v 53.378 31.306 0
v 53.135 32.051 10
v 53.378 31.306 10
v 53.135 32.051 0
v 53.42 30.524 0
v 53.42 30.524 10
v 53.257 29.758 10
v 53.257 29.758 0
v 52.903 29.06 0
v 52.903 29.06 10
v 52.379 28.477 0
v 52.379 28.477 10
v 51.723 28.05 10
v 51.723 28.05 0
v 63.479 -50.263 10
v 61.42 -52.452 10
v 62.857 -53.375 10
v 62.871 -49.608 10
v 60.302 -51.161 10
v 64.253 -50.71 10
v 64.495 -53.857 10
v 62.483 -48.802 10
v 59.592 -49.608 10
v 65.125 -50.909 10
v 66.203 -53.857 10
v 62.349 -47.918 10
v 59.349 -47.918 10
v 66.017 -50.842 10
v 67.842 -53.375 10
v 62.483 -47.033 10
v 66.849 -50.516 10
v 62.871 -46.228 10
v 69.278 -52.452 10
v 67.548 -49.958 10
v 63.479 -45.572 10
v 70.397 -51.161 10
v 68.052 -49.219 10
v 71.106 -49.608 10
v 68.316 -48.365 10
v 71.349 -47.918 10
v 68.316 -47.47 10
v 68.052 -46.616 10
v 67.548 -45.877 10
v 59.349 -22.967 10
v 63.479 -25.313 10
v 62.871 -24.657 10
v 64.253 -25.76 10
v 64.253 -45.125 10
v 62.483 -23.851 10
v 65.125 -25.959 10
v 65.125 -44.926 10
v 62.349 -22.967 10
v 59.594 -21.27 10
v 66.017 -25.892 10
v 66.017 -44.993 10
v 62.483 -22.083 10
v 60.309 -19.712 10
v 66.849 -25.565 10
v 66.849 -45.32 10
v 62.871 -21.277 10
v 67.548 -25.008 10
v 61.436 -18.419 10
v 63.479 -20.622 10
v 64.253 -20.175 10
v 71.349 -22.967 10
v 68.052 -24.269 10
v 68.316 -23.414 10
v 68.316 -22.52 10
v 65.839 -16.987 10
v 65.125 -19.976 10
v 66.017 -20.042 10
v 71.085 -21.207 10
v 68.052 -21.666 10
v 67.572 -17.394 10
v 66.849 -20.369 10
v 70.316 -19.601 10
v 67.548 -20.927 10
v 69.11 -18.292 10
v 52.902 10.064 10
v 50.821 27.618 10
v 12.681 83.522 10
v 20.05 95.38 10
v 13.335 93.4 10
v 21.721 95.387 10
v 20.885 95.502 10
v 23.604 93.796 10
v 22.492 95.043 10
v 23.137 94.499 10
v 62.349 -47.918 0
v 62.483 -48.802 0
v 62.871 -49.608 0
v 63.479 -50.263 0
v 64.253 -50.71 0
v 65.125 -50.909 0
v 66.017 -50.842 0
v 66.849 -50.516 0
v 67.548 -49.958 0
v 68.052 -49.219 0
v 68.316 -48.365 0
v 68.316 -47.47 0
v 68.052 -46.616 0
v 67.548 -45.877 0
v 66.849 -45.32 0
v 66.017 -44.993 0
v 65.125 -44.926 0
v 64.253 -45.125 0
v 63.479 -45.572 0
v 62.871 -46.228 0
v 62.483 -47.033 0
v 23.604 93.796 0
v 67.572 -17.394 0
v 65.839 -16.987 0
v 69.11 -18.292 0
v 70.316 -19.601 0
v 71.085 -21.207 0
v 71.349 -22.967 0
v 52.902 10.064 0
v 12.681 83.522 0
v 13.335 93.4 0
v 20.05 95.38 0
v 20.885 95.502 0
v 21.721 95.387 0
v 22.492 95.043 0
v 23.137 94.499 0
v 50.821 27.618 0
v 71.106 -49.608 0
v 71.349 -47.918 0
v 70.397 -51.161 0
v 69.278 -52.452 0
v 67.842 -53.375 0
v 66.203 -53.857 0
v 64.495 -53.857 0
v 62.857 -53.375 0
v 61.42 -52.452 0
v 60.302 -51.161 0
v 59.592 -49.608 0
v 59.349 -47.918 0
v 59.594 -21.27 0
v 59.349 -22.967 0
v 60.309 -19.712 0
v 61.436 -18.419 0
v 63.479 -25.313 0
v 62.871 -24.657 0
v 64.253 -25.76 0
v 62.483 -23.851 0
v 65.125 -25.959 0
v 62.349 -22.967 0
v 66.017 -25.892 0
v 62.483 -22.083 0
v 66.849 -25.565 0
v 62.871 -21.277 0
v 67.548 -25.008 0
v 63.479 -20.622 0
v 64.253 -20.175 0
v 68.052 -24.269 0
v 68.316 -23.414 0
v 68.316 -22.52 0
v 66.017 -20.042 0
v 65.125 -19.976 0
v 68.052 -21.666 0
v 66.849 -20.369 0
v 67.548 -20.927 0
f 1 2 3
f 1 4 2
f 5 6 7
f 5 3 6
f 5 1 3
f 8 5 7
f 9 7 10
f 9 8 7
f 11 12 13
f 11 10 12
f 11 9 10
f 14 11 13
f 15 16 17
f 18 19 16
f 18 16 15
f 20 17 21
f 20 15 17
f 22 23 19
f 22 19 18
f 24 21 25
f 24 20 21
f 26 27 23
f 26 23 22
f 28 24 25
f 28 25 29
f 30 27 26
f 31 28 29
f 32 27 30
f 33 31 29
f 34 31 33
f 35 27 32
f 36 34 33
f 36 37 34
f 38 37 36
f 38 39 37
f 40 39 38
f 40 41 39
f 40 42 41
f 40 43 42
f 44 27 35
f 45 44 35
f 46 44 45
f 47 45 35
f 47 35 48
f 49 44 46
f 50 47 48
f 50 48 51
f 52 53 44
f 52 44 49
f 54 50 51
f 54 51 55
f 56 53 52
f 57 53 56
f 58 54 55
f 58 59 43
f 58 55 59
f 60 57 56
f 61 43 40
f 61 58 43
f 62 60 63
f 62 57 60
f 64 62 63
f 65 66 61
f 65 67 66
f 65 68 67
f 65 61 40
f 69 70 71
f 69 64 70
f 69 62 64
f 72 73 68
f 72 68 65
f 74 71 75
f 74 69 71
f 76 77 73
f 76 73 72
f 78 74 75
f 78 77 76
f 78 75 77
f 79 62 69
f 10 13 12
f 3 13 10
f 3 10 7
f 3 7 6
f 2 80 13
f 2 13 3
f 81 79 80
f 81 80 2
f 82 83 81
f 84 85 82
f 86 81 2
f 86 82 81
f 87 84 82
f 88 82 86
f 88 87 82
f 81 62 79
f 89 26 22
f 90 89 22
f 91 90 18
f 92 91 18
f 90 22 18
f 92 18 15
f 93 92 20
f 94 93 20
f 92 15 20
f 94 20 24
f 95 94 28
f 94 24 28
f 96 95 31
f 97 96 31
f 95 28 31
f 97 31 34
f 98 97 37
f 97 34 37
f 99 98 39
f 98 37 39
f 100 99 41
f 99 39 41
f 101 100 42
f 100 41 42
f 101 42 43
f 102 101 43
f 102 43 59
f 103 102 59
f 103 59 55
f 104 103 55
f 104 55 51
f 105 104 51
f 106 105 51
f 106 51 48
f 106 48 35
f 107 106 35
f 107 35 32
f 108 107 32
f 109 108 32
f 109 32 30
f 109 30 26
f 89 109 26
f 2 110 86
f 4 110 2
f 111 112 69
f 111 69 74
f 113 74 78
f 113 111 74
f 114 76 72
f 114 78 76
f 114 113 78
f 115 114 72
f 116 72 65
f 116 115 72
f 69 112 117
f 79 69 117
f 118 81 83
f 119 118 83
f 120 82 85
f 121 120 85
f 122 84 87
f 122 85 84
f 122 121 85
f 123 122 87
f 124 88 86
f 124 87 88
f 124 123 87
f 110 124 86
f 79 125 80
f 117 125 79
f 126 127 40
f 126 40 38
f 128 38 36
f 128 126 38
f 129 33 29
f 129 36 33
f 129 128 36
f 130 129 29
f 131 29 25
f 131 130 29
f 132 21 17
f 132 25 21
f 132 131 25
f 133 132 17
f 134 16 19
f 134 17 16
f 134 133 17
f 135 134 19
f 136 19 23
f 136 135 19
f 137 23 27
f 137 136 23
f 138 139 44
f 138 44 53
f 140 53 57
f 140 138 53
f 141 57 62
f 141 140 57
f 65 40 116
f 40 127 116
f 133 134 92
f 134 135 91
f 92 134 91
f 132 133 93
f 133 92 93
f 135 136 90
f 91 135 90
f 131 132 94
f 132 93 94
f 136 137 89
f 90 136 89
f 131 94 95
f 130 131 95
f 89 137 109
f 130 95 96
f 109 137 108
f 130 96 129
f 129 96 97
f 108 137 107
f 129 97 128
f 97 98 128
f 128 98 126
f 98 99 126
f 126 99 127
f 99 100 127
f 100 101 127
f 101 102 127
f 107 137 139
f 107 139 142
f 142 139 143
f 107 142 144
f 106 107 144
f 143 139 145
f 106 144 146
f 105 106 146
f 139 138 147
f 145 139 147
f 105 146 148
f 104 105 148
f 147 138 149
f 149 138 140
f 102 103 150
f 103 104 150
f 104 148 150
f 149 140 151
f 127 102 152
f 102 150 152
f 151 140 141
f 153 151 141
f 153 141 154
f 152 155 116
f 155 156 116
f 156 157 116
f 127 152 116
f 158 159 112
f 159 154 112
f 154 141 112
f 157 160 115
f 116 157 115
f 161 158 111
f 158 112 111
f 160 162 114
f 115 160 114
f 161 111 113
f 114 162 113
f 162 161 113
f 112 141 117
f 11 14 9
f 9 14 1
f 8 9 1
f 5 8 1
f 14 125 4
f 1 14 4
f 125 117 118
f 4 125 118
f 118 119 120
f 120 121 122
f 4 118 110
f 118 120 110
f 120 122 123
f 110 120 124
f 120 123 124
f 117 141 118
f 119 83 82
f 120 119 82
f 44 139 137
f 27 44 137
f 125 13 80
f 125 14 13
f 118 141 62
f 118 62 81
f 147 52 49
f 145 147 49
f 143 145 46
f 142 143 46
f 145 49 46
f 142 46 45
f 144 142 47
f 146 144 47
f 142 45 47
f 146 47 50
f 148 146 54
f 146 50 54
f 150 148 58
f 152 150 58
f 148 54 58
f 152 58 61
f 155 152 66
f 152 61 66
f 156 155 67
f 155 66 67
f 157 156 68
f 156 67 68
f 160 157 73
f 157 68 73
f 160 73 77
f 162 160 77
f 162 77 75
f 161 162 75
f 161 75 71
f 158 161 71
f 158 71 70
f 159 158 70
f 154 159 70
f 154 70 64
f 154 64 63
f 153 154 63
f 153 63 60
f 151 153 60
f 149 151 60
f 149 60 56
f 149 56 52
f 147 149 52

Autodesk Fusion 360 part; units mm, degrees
sketch "Sketch1" plane through (0, 0, 0) normal (0, 0, 1) x (1, 0, 0)
  line L0 (59.3493, -22.9672) -> (59.3493, -47.9176)
  arc A0 (59.3493, -47.9176) -> (71.3493, -47.9176) centre (65.3493, -47.9176) ccw
  line L1 (71.3493, -47.9176) -> (71.3493, -22.9672)
  arc A1 (71.3493, -22.9672) -> (59.3493, -22.9672) centre (65.3493, -22.9672) ccw
  line L2 (65.3493, -22.9672) -> (65.3493, -47.9176) construction
  line L3 (61.4359, -18.4191) -> (12.6813, 83.5221)
  line L4 (12.6813, 83.5221) -> (13.3354, 93.4004)
  line L5 (13.3354, 93.4004) -> (20.0498, 95.3795)
  line L6 (23.6044, 93.7962) -> (53.1349, 32.0506)
  arc A2 (23.6044, 93.7962) -> (20.0498, 95.3795) centre (20.898, 92.5019) ccw
  line L7 (65.8452, -17.0002) -> (52.9015, 10.0639)
  line L8 (51.7229, 28.0498) -> (50.8208, 27.6184)
  line L9 (50.8208, 27.6184) -> (52.9015, 10.0639)
  arc A3 (51.7229, 28.0498) -> (53.1349, 32.0506) centre (50.4285, 30.7562) ccw
  point P0 (22.5016, 96.1021)
  point P1 (54.4293, 29.3442)
  dimension "d1" = 12
  dimension "d2" = 113
  dimension "d3" = 154.44
  dimension "d4" = 74
  dimension "d5" = 9.9
  dimension "d7" = 3
  dimension "d8" = 7
  dimension "d9" = 30
  dimension "d10" = 4.59
  dimension "d11" = 3
  dimension "d12" = 1
extrude "Extrude1" add sketch "Sketch1" along normal blind 10
sketch "Sketch2" plane through (0, 0, 10) normal (0, 0, 1) x (-1, 0, 0)
  line L0 (-50.8208, -27.6184) -> (-51.7229, -28.0498)
  arc A0 (-51.7229, -28.0498) -> (-53.1349, -32.0506) centre (-50.4285, -30.7562) ccw
  line L1 (-53.1349, -32.0506) -> (-23.6044, -93.7962)
  arc A1 (-23.6044, -93.7962) -> (-20.0498, -95.3795) centre (-20.898, -92.5019) ccw
  line L2 (-20.0498, -95.3795) -> (-13.3354, -93.4004)
  line L3 (-13.3354, -93.4004) -> (-12.6813, -83.5221)
  line L4 (-12.6813, -83.5221) -> (-61.4359, 18.4191)
  arc A2 (-61.4359, 18.4191) -> (-59.3493, 22.9672) centre (-65.3493, 22.9672) ccw
  line L5 (-59.3493, 22.9672) -> (-59.3493, 47.9176)
  arc A3 (-59.3493, 47.9176) -> (-71.3493, 47.9176) centre (-65.3493, 47.9176) ccw
  line L6 (-71.3493, 47.9176) -> (-71.3493, 22.9672)
  arc A4 (-71.3493, 22.9672) -> (-65.839, 16.9872) centre (-65.3493, 22.9672) ccw
  line L7 (-65.839, 16.9872) -> (-52.9015, -10.0639)
  line L8 (-52.9015, -10.0639) -> (-50.8208, -27.6184)
  circle A5 centre (-65.3493, 22.9672) radius 3
  circle A6 centre (-65.3493, 47.9176) radius 3
  dimension "d15" = 6
  dimension "d16" = 6
extrude "Extrude2" cut sketch "Sketch2" against normal blind 30 contours A5 | A6
